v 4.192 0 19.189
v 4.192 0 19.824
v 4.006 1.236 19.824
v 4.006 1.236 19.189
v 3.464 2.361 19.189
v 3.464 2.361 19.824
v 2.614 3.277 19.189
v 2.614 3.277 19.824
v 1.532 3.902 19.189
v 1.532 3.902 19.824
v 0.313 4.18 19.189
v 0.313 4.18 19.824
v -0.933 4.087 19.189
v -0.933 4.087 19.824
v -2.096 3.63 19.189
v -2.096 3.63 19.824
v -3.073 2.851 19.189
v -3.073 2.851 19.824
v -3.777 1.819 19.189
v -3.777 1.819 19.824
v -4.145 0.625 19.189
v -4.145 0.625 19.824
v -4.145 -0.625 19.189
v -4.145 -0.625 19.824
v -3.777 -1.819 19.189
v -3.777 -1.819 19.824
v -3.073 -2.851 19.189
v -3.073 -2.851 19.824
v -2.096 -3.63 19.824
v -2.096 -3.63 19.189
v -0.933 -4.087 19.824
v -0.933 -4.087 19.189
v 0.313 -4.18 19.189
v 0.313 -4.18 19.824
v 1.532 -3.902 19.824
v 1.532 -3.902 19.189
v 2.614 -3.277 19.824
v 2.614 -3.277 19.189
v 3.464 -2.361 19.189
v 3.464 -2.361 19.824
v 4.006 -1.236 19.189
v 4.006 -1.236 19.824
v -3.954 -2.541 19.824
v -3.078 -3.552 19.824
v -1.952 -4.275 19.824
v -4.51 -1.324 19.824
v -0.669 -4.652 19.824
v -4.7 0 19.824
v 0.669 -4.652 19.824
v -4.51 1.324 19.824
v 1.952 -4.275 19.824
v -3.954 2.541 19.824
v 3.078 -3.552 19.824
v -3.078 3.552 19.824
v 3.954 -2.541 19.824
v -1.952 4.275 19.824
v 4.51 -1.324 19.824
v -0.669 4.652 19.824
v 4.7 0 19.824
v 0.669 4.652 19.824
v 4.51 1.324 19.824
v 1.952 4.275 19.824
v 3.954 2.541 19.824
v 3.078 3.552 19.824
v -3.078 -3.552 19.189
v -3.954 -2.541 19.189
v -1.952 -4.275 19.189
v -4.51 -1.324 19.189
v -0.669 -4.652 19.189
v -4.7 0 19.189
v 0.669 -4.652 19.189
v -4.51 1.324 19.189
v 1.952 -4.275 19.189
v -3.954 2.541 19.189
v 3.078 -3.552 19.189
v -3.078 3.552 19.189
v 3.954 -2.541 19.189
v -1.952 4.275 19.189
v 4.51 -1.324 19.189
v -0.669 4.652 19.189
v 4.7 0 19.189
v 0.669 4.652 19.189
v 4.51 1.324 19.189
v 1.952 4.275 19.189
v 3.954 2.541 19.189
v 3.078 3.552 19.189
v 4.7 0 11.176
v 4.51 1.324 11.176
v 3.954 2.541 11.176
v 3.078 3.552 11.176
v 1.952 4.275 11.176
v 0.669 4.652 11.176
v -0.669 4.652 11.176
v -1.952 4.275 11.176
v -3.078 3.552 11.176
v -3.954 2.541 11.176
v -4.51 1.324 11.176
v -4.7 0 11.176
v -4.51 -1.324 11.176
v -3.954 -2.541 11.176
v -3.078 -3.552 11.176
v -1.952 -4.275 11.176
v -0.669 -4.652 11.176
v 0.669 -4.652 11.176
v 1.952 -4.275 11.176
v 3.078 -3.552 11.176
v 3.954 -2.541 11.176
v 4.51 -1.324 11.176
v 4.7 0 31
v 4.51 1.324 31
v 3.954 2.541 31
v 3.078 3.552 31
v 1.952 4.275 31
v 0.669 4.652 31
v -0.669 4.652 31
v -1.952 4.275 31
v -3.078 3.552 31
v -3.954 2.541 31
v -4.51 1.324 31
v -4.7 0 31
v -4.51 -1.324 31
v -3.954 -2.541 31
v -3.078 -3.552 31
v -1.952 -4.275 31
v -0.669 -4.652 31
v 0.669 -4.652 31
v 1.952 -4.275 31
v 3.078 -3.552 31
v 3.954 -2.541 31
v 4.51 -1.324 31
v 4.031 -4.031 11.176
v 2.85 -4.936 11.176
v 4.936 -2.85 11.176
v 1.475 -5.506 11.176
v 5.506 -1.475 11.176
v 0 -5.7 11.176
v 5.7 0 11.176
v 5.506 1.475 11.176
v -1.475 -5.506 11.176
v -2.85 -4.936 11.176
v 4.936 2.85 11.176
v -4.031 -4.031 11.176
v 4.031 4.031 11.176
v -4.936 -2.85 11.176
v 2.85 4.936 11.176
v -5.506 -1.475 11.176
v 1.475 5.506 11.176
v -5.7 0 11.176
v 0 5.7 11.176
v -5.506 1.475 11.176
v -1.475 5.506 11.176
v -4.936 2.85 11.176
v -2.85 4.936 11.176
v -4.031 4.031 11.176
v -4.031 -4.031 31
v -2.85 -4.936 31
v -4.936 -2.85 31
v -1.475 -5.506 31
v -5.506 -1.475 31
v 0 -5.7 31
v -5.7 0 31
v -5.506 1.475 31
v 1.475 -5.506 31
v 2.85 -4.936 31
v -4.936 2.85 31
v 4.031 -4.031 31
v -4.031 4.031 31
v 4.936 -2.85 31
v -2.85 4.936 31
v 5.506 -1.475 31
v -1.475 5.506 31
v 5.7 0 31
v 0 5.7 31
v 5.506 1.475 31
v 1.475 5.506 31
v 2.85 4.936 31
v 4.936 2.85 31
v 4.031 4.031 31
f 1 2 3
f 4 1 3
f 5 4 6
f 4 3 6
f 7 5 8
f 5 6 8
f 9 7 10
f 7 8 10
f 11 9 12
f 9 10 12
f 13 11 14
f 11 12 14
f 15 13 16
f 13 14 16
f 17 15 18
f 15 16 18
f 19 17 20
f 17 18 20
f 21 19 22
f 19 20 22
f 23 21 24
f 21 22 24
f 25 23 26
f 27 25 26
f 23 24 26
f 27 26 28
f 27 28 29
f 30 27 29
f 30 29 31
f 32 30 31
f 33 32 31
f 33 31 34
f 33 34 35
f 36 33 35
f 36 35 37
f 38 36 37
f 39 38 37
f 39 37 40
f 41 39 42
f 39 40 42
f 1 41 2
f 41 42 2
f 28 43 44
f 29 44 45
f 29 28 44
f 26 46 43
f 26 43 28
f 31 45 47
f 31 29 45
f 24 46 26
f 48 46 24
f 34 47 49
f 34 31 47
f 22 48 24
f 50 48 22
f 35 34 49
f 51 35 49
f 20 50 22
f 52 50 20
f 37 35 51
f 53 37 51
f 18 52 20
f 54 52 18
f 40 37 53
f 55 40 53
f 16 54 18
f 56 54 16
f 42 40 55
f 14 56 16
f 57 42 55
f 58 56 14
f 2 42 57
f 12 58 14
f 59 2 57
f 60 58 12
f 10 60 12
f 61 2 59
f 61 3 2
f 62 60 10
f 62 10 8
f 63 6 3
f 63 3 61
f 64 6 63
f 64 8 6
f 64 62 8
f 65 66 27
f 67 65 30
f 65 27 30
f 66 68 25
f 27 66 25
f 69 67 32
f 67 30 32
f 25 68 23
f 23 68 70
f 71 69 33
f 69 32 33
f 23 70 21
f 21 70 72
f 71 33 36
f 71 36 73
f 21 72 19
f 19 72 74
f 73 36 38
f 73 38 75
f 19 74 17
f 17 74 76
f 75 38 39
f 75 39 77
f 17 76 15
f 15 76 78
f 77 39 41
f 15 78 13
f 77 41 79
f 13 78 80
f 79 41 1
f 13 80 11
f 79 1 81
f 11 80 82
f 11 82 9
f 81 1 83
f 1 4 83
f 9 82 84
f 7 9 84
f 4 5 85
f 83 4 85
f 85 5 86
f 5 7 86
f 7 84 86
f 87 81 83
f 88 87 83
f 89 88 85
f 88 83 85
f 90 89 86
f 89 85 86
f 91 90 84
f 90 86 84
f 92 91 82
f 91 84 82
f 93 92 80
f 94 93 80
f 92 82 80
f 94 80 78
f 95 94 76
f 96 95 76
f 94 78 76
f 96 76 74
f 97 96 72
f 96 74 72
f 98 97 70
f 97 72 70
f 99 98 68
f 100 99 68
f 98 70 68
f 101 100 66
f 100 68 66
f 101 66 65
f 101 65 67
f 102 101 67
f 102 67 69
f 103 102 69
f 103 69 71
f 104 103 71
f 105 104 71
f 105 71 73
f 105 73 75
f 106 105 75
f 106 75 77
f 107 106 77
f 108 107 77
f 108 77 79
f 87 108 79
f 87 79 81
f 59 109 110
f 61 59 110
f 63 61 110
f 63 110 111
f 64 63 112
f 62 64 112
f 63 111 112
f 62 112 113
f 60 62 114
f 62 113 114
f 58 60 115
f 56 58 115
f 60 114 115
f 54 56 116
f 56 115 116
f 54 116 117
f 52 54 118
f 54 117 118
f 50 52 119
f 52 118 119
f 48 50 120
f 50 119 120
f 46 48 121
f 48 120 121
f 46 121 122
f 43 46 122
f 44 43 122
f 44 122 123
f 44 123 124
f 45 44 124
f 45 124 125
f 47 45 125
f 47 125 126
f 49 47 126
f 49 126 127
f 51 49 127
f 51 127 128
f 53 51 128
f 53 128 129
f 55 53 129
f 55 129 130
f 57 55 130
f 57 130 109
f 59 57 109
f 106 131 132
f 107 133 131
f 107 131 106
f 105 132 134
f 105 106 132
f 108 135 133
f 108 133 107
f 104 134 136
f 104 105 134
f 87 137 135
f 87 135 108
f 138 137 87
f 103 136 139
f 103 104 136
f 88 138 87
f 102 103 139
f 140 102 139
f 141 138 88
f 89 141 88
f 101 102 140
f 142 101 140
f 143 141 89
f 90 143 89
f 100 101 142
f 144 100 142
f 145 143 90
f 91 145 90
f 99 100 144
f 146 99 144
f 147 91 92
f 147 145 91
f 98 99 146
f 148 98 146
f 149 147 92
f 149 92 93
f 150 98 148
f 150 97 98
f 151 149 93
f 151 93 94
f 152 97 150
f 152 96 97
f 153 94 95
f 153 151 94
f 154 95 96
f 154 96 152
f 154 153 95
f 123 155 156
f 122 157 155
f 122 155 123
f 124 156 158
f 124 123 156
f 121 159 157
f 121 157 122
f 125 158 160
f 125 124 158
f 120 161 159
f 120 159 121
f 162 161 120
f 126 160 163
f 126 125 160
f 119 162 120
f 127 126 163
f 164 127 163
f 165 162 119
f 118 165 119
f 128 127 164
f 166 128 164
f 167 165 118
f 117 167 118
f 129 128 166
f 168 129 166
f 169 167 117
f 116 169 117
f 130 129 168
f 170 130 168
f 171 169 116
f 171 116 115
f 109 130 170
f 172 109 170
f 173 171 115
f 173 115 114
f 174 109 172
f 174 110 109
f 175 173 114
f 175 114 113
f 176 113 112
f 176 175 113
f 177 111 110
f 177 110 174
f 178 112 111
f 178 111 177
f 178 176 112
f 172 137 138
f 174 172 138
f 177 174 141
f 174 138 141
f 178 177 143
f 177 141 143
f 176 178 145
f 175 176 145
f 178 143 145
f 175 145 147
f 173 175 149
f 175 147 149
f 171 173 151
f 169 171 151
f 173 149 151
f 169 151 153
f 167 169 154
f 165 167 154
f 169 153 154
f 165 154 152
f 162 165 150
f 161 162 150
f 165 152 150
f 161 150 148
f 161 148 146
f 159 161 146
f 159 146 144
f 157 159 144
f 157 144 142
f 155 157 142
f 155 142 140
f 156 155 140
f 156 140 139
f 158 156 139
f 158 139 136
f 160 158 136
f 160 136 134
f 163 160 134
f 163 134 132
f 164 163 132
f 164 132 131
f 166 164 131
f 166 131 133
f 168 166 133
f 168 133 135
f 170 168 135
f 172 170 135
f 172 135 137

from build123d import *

# Parameters (mm, degrees)
SKETCH1_R           = 5.7
BOSS_EXTRUDE1_DEPTH = 31
SKETCH2_R           = 4.7
CUT_EXTRUDE1_DEPTH  = 33.302
SKETCH5_R           = 4.7
SKETCH5_R_2         = 4.192
BOSS_EXTRUDE3_DEPTH = 0.635
SKETCH8_R           = 5.7
SKETCH8_R_2         = 4.7
CUT_EXTRUDE2_DEPTH  = 11.176


with BuildPart() as part:
    # Sketch1 → Boss-Extrude1 (new body)
    with BuildSketch(Plane.XY):
        Circle(SKETCH1_R)
    extrude(amount=BOSS_EXTRUDE1_DEPTH)

    # Sketch2 → Cut-Extrude1 (cut)
    with BuildSketch(Plane.XY.offset(31)):
        Circle(SKETCH2_R)
    extrude(amount=-CUT_EXTRUDE1_DEPTH, mode=Mode.SUBTRACT)

    # Sketch5 → Boss-Extrude3 (add)
    with BuildSketch(Plane.XY.offset(19.824)):
        Circle(SKETCH5_R)
        Circle(SKETCH5_R_2, mode=Mode.SUBTRACT)
    extrude(amount=-BOSS_EXTRUDE3_DEPTH)

    # Sketch8 → Cut-Extrude2 (cut)
    with BuildSketch(Plane(origin=(0, 0, 0), x_dir=(-1, 0, 0), z_dir=(0, 0, -1))):
        Circle(SKETCH8_R)
        Circle(SKETCH8_R_2, mode=Mode.SUBTRACT)
    extrude(amount=-CUT_EXTRUDE2_DEPTH, mode=Mode.SUBTRACT)


solid = part.part
